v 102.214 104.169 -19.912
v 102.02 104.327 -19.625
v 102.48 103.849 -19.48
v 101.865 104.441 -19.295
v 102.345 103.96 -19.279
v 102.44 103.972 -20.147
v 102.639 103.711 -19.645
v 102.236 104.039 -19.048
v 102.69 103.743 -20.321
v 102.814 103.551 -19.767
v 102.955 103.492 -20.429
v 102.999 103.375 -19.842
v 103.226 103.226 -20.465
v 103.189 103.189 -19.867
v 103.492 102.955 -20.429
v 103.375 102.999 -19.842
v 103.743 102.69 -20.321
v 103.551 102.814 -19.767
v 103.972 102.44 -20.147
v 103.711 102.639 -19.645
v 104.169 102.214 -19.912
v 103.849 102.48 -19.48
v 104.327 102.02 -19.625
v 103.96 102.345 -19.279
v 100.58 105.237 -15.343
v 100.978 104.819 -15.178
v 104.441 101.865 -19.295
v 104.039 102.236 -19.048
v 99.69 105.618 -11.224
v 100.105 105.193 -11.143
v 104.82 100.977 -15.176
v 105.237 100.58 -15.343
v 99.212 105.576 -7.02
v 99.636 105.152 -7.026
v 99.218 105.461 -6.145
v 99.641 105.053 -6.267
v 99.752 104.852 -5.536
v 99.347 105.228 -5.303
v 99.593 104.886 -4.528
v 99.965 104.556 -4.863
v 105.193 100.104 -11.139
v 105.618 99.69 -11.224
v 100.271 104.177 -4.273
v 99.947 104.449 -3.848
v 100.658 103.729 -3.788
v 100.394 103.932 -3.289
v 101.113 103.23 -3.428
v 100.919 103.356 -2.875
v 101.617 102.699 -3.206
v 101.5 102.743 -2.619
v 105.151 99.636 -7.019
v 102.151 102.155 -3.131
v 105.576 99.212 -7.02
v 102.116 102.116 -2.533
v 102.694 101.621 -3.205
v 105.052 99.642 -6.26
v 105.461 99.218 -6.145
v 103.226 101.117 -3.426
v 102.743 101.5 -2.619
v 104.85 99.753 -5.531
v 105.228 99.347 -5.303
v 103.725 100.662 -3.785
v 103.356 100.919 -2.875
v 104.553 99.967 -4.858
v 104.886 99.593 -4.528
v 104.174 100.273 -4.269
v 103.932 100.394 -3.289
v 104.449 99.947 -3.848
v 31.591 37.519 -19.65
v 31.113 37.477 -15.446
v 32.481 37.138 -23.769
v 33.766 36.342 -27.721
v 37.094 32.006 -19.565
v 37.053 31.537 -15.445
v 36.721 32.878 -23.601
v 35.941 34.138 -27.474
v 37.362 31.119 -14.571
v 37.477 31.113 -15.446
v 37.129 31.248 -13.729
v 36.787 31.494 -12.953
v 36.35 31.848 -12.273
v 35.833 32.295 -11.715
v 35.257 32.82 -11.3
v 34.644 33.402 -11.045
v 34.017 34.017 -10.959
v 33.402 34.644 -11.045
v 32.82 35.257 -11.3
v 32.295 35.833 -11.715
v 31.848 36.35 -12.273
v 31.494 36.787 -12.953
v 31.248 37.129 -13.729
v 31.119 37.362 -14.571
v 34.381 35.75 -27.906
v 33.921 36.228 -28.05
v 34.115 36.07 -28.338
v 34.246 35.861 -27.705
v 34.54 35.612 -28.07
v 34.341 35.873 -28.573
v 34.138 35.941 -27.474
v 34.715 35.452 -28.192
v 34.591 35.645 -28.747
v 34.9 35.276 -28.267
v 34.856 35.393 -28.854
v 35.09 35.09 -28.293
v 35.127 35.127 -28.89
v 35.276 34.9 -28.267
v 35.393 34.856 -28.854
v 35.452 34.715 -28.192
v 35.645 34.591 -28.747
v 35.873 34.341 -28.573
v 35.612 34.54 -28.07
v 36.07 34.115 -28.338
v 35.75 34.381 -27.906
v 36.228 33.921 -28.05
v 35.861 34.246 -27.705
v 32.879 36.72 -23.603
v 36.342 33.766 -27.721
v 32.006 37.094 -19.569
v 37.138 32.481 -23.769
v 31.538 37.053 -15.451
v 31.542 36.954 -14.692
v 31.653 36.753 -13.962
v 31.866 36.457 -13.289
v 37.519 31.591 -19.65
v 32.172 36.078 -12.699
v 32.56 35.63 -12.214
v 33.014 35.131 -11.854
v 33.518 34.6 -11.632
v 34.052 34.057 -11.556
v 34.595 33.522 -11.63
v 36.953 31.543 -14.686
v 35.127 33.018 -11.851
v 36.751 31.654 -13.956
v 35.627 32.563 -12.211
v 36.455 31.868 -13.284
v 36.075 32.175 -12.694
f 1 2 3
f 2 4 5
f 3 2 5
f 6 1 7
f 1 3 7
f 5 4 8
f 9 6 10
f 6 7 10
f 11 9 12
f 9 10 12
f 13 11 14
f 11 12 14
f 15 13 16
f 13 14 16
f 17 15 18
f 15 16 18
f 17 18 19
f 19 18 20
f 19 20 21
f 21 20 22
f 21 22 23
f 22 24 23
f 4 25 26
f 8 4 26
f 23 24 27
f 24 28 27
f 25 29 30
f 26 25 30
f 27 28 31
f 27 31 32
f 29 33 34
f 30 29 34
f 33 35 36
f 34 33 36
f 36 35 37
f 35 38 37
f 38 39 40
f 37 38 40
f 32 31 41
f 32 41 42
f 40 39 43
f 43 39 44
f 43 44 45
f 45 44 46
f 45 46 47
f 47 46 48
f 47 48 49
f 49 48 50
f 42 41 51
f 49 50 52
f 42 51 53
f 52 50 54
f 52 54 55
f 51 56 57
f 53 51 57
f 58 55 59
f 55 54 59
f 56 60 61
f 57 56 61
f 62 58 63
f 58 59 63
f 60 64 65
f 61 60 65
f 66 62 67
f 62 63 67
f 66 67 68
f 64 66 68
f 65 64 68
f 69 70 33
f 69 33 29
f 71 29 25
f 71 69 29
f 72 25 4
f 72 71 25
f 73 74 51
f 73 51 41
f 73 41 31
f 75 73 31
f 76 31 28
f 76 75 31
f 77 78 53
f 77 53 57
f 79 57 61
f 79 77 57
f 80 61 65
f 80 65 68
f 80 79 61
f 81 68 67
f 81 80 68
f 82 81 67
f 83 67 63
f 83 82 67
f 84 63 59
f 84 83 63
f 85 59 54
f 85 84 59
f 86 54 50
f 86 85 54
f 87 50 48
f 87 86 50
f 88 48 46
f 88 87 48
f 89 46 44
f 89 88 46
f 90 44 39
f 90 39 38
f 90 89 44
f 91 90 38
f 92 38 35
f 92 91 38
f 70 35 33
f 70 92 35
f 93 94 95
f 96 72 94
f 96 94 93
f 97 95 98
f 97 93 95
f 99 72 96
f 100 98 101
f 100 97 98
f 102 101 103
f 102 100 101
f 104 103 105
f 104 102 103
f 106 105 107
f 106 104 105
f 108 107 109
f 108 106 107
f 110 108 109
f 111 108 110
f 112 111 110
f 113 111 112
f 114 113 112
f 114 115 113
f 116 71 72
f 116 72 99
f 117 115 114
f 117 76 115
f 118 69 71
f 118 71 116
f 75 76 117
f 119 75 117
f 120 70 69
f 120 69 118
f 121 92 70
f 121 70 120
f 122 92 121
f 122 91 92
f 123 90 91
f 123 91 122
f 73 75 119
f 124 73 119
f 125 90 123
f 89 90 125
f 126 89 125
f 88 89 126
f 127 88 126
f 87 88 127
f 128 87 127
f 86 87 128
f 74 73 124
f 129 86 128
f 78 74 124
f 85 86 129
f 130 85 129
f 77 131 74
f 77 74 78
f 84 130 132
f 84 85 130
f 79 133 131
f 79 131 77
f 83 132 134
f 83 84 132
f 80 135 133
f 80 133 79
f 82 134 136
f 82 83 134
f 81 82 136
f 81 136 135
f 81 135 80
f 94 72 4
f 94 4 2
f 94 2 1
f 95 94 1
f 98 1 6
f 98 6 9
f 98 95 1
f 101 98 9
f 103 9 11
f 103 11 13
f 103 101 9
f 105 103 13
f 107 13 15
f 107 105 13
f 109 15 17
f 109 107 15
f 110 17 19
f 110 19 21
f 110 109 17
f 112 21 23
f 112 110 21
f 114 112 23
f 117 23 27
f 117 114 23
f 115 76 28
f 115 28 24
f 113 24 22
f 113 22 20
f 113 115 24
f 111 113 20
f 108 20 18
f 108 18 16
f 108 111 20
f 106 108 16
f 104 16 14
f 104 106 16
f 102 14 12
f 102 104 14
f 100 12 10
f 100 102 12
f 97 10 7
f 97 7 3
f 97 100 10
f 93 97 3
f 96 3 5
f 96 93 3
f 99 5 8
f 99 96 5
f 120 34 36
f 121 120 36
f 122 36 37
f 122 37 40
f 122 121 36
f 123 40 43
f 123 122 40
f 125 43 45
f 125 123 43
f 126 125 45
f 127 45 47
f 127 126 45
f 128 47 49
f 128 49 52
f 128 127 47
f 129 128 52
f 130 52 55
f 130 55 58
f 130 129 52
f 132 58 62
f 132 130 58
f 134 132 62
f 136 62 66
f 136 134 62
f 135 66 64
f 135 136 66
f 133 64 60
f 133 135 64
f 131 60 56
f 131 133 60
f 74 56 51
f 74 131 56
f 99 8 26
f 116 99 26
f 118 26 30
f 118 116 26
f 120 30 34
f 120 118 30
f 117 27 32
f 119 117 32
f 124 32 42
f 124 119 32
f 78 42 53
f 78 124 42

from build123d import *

# Parameters (mm, degrees)
BOSS_EXTRUDE1_DEPTH = 96.674201326


with BuildPart() as part:
    # Sketch1 → Boss-Extrude1 (new body)
    with BuildSketch(Plane(origin=(33.08614304, 33.08614304, 4.093670875), x_dir=(0.707106781, -0.707106781, 0), z_dir=(-0.704416026, -0.704416026, -0.087155743))):
        with BuildLine():
            ThreePointArc((-4.50000347, -19.614075699), (-3.815448832, -25.917485875), (-1.82137714, -31.936229348))
            ThreePointArc((-1.82137714, -31.936229348), (8.178e-06, -33.110098509), (1.821383894, -31.936214448))
            ThreePointArc((1.821383894, -31.936214448), (3.815427721, -25.917468388), (4.50000349, -19.614066852))
            ThreePointArc((4.50000349, -19.614066852), (-4.417e-06, -15.110036834), (-4.50000347, -19.614075699))
        make_face()
        with BuildLine():
            ThreePointArc((1.274961922, -31.68837775), (-8e-09, -32.510085588), (-1.274961931, -31.688377739))
            ThreePointArc((-1.274961931, -31.688377739), (-3.22841338, -25.793381652), (-3.8999884, -19.619570962))
            ThreePointArc((-3.8999884, -19.619570962), (-0.003114143, -15.70968365), (3.900003566, -19.613338337))
            ThreePointArc((3.900003566, -19.613338337), (3.229075576, -25.790336504), (1.274961922, -31.68837775))
        make_face(mode=Mode.SUBTRACT)
    extrude(amount=-BOSS_EXTRUDE1_DEPTH)


solid = part.part
